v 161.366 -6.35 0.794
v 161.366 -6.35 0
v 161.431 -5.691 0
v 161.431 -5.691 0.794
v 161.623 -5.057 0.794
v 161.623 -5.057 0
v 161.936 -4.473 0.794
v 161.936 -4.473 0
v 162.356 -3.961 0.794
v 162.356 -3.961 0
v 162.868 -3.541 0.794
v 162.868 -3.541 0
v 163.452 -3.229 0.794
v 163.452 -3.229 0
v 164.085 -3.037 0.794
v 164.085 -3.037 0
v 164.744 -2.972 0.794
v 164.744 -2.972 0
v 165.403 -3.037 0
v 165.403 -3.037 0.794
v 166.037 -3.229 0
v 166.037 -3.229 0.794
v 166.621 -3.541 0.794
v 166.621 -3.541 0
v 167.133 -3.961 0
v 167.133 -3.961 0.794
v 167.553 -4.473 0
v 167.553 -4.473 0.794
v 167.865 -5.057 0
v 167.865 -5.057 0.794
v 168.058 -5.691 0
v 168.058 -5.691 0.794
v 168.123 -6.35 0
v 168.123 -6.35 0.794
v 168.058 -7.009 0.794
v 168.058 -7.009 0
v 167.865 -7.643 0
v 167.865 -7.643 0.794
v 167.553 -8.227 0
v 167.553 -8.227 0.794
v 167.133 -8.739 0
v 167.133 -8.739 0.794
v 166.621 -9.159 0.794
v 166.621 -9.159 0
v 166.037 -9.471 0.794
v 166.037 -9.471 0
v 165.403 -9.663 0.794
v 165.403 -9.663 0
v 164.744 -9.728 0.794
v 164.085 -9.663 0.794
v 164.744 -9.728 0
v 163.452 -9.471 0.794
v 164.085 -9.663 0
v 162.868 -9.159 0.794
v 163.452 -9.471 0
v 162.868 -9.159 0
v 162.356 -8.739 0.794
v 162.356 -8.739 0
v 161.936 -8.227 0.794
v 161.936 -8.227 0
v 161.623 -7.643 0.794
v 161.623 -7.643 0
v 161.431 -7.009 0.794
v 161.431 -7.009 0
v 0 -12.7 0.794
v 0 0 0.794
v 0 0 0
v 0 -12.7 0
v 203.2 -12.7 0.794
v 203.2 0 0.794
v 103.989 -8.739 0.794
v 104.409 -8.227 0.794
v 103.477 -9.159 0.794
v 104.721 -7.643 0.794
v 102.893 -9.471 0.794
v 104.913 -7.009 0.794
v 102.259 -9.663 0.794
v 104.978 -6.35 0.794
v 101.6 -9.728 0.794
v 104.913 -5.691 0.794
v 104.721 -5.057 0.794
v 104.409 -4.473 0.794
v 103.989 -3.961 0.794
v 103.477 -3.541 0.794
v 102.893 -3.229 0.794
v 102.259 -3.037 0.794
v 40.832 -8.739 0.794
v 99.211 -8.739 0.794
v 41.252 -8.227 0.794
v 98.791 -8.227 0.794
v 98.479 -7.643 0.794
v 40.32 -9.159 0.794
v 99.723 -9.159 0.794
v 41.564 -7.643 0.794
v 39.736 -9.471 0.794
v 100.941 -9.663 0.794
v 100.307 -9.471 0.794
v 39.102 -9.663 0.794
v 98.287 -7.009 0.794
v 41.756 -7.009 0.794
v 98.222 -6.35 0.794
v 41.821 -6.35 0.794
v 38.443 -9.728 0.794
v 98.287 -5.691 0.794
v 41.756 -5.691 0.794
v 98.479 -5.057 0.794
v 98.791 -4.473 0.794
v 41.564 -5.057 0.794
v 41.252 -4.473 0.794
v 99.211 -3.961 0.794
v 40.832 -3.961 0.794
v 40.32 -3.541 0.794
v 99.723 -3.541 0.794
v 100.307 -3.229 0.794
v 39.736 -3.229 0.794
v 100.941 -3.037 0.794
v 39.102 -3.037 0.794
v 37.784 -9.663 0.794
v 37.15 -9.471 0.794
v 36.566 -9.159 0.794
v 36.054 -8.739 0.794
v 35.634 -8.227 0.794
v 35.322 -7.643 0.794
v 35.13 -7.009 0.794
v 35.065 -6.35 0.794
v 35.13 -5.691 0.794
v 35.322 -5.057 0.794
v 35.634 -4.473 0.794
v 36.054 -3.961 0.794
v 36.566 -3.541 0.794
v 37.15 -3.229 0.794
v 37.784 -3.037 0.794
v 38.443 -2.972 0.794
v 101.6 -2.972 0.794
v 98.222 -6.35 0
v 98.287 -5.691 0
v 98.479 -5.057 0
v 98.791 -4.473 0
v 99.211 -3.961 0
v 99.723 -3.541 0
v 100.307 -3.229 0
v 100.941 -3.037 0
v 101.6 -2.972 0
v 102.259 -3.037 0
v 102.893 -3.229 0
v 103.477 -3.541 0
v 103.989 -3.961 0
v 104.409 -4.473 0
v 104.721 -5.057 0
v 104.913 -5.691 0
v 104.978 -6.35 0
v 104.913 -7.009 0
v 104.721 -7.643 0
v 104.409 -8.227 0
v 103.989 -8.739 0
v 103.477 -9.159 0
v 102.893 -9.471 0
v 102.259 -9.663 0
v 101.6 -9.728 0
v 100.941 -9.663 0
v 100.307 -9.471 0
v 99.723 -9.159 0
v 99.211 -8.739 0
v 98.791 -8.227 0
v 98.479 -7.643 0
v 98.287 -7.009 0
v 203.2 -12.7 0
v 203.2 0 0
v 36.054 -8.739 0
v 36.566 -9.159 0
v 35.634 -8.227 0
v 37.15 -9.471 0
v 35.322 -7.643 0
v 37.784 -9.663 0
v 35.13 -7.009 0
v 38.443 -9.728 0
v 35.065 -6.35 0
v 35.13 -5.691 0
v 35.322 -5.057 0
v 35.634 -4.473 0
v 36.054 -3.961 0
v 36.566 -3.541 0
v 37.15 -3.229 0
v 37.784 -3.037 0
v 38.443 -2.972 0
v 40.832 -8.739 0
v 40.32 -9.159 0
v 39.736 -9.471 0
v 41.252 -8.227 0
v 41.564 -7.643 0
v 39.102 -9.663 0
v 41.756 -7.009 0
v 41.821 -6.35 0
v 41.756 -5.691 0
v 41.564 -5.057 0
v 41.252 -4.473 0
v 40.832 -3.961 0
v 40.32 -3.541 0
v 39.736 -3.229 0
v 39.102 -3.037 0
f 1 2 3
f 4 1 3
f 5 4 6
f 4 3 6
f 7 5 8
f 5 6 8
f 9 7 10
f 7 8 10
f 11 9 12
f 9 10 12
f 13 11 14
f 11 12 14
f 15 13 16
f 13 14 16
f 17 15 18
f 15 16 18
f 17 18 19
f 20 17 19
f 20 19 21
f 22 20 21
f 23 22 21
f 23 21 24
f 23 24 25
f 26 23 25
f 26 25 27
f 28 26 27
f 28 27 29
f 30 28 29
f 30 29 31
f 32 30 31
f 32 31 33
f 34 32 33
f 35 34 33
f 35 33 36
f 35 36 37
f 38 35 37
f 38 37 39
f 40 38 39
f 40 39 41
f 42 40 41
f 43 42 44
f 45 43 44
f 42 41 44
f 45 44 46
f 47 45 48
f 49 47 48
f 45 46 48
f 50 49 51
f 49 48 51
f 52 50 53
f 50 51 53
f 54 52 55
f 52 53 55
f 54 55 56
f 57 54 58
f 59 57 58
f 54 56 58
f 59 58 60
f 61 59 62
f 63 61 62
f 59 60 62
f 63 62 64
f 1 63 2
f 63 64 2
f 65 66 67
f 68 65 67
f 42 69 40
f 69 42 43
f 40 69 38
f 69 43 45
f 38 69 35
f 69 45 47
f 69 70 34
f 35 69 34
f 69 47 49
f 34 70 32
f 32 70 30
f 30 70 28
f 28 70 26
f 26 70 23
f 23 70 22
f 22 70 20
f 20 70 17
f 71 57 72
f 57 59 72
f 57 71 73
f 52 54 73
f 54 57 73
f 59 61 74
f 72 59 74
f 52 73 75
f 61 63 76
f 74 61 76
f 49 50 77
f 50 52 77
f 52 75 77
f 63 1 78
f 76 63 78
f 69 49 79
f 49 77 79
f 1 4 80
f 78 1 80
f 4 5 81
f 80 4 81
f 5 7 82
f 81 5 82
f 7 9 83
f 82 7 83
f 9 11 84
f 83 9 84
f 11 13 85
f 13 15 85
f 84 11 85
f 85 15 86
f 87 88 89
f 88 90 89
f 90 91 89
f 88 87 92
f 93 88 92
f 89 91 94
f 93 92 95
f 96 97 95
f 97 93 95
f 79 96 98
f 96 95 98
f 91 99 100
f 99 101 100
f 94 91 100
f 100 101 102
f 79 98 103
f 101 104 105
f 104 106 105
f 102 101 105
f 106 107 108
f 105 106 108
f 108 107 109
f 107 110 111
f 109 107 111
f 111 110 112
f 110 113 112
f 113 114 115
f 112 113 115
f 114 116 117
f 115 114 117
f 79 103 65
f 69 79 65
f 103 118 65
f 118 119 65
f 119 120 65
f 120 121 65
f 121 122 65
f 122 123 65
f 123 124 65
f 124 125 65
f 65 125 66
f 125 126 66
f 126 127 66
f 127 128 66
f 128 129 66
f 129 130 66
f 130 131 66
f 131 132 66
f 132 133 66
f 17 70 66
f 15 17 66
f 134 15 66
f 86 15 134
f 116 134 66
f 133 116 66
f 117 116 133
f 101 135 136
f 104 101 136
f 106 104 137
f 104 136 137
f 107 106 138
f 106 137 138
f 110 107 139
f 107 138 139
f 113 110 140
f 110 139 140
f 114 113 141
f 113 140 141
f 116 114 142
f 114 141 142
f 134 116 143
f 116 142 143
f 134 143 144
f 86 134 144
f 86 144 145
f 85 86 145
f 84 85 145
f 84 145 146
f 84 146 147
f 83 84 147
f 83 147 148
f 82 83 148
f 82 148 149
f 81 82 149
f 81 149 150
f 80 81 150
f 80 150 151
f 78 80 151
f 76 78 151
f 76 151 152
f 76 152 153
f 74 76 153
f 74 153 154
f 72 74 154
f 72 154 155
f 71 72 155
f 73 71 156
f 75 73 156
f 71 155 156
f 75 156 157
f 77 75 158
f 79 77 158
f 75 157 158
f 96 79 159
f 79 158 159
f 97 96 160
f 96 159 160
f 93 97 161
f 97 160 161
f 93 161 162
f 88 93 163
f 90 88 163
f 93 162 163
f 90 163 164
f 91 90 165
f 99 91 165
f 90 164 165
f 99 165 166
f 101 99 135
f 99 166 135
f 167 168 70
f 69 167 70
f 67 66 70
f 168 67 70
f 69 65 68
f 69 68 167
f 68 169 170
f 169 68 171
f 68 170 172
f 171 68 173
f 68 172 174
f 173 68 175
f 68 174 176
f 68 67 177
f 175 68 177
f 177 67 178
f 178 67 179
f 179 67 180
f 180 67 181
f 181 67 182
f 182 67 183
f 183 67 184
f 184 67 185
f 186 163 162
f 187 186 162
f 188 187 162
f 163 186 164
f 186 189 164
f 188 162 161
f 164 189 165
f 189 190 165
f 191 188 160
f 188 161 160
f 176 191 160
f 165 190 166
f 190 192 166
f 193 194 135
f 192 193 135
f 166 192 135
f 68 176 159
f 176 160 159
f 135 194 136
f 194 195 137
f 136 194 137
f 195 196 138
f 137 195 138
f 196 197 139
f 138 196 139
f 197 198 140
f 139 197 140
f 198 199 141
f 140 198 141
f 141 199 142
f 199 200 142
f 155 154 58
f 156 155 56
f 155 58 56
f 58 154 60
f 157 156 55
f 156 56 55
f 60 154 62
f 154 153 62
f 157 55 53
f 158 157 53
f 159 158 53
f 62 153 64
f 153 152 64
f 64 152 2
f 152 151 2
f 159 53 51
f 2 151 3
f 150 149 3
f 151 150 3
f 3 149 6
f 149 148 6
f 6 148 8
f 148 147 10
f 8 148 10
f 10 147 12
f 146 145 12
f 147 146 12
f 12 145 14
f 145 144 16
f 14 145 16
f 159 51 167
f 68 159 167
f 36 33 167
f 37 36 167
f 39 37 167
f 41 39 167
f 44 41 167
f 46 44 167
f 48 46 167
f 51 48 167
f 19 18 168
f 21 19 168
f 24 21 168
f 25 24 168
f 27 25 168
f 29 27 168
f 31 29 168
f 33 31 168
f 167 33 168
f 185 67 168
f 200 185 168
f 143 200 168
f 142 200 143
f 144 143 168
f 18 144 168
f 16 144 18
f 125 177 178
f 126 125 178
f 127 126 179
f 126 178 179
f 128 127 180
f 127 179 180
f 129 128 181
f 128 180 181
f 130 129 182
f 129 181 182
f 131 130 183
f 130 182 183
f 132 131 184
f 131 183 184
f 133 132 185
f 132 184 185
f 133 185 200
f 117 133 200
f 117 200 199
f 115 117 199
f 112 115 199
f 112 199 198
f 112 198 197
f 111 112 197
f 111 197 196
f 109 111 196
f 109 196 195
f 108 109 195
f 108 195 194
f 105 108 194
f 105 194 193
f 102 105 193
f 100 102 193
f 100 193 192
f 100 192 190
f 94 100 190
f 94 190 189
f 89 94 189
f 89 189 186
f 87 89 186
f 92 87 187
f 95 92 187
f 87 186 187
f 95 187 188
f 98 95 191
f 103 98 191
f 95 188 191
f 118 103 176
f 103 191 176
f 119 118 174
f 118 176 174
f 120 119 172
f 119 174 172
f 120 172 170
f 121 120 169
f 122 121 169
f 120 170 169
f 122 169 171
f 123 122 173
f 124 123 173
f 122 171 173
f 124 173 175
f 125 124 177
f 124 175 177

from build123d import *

# Parameters (mm, degrees)
F1_DEPTH = 12.7
F3_D     = 6.7564


with BuildPart() as f1:
    # F0 (on Front) → F1 (new body)
    with BuildSketch(Plane.XZ):
        Polygon((0, 0.79375), (0, 0), (203.2, 0), (203.2, 0.79375), (187.6806, 0.79375), (183.8680549408, 0.79375), (19.3244994099, 0.79375), (15.5119543507, 0.79375), align=None)
    extrude(amount=F1_DEPTH)

    # F3 (through all)
    with Locations(Plane.XY.offset(0.79375)):
        with Locations((101.6, -6.35), (38.4429, -6.35), (164.7444, -6.35)):
            Hole(F3_D / 2)


solid = f1.part
